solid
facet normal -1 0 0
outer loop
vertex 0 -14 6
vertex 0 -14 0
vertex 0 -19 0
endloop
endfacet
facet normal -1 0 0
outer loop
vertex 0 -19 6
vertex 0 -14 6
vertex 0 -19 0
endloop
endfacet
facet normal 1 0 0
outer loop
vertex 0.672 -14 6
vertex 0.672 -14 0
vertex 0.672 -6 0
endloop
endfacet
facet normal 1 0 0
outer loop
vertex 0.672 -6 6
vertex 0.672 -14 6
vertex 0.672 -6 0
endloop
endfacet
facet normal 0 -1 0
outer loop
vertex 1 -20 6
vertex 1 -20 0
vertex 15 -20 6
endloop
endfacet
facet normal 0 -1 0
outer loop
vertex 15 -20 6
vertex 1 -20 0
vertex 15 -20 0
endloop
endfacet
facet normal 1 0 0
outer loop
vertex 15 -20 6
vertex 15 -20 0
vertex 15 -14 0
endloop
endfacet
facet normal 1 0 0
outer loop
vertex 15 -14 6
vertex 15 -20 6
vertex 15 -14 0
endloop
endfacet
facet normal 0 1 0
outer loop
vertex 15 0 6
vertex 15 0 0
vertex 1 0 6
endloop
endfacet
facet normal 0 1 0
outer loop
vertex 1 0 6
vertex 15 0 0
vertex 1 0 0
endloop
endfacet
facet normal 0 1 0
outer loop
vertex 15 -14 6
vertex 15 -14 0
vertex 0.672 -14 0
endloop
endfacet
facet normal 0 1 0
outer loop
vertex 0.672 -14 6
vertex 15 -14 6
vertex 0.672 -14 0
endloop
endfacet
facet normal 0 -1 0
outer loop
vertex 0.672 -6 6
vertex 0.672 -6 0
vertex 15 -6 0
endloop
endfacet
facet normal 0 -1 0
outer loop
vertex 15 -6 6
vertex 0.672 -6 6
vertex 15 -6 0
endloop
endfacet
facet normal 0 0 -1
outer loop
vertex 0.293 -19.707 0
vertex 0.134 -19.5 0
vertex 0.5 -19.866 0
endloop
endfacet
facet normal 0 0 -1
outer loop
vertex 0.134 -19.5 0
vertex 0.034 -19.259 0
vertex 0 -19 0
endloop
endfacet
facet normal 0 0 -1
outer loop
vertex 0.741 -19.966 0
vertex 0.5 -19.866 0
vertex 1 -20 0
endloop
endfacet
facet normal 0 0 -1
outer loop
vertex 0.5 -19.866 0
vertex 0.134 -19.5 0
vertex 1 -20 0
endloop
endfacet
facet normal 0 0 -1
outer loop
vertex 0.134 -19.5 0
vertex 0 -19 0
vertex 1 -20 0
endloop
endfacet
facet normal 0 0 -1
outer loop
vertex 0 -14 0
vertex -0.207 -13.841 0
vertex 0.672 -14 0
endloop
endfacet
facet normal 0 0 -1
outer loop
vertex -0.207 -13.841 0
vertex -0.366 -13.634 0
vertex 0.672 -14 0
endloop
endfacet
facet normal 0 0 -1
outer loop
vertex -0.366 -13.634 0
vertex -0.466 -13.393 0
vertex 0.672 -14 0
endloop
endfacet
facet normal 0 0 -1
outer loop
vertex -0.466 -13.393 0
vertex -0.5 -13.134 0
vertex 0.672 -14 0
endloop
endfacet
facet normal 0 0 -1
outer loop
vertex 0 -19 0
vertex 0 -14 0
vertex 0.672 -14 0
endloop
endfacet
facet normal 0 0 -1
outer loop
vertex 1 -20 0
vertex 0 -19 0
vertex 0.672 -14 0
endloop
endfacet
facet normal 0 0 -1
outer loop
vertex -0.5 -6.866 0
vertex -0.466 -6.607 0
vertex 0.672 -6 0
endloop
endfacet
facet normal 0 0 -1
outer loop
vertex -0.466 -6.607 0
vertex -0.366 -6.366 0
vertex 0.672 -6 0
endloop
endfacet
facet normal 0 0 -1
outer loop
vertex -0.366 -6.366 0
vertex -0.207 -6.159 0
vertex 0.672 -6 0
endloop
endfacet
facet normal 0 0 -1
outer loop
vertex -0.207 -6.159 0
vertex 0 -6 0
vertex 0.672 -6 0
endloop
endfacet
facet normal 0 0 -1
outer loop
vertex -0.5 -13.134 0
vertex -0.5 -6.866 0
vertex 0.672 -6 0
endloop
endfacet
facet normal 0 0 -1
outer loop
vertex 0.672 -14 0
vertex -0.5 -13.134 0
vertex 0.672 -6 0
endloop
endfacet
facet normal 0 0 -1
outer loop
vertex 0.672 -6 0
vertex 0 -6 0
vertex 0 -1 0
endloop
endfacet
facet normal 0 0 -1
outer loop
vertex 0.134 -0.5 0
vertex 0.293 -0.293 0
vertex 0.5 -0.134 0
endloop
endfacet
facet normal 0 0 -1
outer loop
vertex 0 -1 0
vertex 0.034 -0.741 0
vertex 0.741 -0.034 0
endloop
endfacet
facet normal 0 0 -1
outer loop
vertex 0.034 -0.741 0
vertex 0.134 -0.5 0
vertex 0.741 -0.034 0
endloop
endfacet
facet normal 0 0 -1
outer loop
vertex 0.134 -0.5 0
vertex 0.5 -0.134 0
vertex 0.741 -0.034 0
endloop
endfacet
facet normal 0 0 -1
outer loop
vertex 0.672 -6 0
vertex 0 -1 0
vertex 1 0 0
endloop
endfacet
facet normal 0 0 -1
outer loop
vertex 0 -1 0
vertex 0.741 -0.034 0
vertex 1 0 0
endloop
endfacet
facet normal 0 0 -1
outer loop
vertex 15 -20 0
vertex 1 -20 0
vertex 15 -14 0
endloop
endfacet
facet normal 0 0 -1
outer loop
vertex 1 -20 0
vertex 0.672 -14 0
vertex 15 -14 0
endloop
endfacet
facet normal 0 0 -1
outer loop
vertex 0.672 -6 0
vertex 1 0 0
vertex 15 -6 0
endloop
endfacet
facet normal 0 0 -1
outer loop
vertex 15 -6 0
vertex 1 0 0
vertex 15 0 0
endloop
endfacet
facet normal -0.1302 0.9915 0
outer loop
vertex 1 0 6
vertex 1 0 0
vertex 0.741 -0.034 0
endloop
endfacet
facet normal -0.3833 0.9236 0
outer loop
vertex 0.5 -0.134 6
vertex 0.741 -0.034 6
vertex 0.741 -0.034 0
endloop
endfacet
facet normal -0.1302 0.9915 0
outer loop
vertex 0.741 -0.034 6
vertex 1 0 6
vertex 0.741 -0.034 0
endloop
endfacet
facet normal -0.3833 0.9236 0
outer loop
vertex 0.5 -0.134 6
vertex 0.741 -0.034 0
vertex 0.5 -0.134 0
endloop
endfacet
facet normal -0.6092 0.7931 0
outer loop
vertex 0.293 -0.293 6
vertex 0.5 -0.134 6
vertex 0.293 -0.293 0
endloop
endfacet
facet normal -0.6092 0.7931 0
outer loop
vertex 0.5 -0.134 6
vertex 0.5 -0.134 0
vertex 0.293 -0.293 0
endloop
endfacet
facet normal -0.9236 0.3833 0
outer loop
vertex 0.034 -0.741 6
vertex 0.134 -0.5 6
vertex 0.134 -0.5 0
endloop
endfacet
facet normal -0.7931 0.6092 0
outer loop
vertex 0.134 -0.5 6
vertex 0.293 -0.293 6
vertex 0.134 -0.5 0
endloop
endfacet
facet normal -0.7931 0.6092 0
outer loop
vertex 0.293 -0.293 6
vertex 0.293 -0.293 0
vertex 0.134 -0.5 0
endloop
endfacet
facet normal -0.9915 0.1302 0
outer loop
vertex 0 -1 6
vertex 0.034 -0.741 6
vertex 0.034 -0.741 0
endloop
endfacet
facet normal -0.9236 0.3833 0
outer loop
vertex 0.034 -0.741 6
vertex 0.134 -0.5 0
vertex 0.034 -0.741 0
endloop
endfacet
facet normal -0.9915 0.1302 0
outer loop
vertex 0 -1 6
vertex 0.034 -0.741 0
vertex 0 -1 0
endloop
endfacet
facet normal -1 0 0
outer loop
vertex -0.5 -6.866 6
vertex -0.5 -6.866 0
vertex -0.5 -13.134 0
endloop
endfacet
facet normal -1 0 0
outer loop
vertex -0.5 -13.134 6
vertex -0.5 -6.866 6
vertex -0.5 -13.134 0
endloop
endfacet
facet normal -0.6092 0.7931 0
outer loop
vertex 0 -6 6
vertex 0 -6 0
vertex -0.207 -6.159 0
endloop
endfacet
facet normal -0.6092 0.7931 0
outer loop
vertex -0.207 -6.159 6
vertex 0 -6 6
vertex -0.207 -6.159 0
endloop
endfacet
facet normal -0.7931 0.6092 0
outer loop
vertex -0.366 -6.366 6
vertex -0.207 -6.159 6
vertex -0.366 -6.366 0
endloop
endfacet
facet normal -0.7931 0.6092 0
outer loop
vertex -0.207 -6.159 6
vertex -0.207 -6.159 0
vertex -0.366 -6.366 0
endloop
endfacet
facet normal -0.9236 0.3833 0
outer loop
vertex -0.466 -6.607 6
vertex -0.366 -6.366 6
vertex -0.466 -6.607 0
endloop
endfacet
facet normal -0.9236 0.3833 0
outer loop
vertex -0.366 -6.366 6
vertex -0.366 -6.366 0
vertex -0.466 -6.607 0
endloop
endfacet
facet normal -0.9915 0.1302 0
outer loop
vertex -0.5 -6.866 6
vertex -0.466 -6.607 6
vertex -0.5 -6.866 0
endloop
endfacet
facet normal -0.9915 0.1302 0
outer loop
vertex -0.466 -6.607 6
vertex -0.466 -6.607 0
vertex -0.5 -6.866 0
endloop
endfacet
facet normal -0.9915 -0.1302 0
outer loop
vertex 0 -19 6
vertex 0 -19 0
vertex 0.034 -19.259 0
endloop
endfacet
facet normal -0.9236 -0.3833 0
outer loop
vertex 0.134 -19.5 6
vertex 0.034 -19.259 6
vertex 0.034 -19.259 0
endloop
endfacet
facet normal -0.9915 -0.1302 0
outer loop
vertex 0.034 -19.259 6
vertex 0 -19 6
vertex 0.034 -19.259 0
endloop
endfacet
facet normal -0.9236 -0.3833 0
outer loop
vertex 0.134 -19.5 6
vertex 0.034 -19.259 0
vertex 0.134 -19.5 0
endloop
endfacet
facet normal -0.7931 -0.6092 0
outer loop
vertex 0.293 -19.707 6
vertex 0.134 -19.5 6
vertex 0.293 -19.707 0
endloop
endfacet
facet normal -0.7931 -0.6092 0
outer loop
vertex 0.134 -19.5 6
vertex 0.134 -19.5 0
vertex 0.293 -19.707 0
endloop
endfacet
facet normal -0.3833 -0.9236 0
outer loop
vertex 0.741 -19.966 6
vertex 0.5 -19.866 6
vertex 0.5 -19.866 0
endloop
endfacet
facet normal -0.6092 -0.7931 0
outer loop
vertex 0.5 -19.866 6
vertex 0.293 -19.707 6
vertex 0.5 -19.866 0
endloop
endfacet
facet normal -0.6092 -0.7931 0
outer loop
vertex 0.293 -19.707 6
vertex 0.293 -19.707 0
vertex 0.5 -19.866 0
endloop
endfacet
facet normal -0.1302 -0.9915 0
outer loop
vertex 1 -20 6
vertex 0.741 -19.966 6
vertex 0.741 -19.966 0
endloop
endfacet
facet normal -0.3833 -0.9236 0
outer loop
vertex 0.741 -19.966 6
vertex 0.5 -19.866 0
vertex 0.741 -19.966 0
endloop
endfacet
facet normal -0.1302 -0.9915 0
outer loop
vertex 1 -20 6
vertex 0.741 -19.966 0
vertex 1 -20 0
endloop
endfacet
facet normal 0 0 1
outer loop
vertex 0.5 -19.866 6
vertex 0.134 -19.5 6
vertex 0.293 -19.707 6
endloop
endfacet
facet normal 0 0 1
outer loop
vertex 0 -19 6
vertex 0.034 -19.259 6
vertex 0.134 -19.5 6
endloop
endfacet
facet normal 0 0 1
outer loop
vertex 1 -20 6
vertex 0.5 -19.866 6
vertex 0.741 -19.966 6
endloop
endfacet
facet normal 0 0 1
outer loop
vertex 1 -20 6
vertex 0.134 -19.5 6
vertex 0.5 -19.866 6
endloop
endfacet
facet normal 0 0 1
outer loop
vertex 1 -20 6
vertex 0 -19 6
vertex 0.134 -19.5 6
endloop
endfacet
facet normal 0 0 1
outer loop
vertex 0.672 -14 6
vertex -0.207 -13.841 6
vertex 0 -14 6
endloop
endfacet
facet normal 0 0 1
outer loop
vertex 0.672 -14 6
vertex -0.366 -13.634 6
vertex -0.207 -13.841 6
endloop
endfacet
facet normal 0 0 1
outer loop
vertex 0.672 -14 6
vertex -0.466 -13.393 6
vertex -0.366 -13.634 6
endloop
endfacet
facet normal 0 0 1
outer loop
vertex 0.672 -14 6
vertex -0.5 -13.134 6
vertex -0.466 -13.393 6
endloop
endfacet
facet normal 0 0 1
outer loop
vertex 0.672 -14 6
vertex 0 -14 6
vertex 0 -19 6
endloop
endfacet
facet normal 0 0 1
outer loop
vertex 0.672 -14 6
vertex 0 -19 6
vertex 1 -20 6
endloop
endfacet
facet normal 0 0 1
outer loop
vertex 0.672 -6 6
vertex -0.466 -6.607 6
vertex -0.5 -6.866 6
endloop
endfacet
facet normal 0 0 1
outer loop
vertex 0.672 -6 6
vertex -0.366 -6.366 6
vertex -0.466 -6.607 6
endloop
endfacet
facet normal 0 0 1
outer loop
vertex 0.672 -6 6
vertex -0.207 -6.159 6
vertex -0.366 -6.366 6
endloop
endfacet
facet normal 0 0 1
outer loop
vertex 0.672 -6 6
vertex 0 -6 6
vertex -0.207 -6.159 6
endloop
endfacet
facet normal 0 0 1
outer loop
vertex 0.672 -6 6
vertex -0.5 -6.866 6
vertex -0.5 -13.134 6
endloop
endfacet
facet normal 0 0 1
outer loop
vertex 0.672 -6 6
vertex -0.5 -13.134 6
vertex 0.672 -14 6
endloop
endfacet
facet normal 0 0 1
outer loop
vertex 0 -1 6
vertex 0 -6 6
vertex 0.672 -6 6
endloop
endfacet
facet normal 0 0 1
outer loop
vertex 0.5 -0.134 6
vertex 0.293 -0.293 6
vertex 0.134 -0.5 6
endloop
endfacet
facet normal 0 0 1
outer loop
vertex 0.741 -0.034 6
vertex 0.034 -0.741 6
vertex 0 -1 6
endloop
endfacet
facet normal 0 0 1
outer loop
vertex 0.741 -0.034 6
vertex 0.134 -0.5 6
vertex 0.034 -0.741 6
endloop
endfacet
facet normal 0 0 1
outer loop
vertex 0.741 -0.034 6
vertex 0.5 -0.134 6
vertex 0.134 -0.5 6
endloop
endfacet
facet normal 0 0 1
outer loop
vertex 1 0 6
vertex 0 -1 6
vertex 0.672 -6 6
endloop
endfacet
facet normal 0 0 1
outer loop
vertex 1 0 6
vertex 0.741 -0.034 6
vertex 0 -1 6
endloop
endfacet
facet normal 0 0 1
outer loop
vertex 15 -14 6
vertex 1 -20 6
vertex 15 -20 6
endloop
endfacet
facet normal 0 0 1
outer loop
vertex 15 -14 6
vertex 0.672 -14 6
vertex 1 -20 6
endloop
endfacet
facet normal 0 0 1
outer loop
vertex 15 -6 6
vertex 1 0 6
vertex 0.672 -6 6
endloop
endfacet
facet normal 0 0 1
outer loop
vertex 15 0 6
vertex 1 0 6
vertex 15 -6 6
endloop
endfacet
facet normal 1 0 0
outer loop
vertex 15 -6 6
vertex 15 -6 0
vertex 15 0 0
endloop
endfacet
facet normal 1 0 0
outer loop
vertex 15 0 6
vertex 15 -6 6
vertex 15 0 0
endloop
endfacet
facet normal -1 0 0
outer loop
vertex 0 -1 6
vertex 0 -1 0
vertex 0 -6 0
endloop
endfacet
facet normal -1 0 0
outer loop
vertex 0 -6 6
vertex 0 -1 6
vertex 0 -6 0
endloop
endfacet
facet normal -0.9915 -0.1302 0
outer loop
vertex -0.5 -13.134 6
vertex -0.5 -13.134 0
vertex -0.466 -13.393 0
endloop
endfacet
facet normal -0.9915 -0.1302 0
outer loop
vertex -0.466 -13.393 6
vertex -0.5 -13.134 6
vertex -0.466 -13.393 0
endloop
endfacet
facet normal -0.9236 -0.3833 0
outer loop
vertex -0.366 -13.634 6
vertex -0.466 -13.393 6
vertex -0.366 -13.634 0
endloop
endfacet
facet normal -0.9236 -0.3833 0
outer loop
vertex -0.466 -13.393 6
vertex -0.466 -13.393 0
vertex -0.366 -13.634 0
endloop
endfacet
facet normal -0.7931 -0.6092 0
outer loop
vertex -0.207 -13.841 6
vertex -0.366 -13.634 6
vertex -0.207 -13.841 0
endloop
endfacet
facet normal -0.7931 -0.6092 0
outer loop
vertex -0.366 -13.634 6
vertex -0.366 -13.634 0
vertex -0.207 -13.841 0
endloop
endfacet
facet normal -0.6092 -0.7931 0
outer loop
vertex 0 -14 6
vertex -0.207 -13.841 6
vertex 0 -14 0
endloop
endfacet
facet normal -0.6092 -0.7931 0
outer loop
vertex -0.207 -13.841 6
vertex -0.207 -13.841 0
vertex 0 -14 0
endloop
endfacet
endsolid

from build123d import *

# Parameters (mm, degrees)
F1_DEPTH    = 6
F2_T1_DEPTH = 10.3301270189
F2_T3_DEPTH = 11


# Not quite as in the source:
# - a fillet or chamfer that OpenCascade refuses, or shapes differently, is made with other operations: its cross-section is extruded or revolved along the edge and cut away or added


with BuildPart() as f1:
    # F0 (on Top) → F1 (new body)
    with BuildSketch(Plane.XY):
        Polygon((15, 0), (0, 0), (0, -4), (0, -6), (0.6717378856, -6), (15, -6), align=None)
        Polygon((0.6717378856, -6), (0, -6), (-0.5, -6), (-0.5, -14), (0, -14), (0.6717378856, -14), align=None)
        Polygon((15, -14), (0.6717378856, -14), (0, -14), (0, -16), (0, -20), (15, -20), align=None)
    extrude(amount=F1_DEPTH)

    # F2: fillet of radius 1 on 4 edges, made by hand

    # F2_s2 → F2_t1 (cut)
    with BuildSketch(Plane.XY.offset(-2.1650635095)):
        with BuildLine():
            ThreePointArc((0, -6), (-0.3660254038, -6.3660254038), (-0.5, -6.8660254038))
            Line((-0.5, -6.8660254038), (-0.5, -6))
            Line((-0.5, -6), (0, -6))
        make_face()
        with BuildLine():
            ThreePointArc((-0.5, -13.1339745962), (-0.3660254038, -13.6339745962), (0, -14))
            Line((0, -14), (-0.5, -14))
            Line((-0.5, -14), (-0.5, -13.1339745962))
        make_face()
    extrude(amount=F2_T1_DEPTH, mode=Mode.SUBTRACT)

    # F2_s4 → F2_t3 (cut)
    with BuildSketch(Plane.XY.offset(-2.5)):
        with BuildLine():
            ThreePointArc((1, 0), (0.2928932188, -0.2928932188), (0, -1))
            Line((0, -1), (0, 0))
            Line((0, 0), (1, 0))
        make_face()
        with BuildLine():
            ThreePointArc((0, -19), (0.2928932188, -19.7071067812), (1, -20))
            Line((1, -20), (0, -20))
            Line((0, -20), (0, -19))
        make_face()
    extrude(amount=F2_T3_DEPTH, mode=Mode.SUBTRACT)


solid = f1.part
